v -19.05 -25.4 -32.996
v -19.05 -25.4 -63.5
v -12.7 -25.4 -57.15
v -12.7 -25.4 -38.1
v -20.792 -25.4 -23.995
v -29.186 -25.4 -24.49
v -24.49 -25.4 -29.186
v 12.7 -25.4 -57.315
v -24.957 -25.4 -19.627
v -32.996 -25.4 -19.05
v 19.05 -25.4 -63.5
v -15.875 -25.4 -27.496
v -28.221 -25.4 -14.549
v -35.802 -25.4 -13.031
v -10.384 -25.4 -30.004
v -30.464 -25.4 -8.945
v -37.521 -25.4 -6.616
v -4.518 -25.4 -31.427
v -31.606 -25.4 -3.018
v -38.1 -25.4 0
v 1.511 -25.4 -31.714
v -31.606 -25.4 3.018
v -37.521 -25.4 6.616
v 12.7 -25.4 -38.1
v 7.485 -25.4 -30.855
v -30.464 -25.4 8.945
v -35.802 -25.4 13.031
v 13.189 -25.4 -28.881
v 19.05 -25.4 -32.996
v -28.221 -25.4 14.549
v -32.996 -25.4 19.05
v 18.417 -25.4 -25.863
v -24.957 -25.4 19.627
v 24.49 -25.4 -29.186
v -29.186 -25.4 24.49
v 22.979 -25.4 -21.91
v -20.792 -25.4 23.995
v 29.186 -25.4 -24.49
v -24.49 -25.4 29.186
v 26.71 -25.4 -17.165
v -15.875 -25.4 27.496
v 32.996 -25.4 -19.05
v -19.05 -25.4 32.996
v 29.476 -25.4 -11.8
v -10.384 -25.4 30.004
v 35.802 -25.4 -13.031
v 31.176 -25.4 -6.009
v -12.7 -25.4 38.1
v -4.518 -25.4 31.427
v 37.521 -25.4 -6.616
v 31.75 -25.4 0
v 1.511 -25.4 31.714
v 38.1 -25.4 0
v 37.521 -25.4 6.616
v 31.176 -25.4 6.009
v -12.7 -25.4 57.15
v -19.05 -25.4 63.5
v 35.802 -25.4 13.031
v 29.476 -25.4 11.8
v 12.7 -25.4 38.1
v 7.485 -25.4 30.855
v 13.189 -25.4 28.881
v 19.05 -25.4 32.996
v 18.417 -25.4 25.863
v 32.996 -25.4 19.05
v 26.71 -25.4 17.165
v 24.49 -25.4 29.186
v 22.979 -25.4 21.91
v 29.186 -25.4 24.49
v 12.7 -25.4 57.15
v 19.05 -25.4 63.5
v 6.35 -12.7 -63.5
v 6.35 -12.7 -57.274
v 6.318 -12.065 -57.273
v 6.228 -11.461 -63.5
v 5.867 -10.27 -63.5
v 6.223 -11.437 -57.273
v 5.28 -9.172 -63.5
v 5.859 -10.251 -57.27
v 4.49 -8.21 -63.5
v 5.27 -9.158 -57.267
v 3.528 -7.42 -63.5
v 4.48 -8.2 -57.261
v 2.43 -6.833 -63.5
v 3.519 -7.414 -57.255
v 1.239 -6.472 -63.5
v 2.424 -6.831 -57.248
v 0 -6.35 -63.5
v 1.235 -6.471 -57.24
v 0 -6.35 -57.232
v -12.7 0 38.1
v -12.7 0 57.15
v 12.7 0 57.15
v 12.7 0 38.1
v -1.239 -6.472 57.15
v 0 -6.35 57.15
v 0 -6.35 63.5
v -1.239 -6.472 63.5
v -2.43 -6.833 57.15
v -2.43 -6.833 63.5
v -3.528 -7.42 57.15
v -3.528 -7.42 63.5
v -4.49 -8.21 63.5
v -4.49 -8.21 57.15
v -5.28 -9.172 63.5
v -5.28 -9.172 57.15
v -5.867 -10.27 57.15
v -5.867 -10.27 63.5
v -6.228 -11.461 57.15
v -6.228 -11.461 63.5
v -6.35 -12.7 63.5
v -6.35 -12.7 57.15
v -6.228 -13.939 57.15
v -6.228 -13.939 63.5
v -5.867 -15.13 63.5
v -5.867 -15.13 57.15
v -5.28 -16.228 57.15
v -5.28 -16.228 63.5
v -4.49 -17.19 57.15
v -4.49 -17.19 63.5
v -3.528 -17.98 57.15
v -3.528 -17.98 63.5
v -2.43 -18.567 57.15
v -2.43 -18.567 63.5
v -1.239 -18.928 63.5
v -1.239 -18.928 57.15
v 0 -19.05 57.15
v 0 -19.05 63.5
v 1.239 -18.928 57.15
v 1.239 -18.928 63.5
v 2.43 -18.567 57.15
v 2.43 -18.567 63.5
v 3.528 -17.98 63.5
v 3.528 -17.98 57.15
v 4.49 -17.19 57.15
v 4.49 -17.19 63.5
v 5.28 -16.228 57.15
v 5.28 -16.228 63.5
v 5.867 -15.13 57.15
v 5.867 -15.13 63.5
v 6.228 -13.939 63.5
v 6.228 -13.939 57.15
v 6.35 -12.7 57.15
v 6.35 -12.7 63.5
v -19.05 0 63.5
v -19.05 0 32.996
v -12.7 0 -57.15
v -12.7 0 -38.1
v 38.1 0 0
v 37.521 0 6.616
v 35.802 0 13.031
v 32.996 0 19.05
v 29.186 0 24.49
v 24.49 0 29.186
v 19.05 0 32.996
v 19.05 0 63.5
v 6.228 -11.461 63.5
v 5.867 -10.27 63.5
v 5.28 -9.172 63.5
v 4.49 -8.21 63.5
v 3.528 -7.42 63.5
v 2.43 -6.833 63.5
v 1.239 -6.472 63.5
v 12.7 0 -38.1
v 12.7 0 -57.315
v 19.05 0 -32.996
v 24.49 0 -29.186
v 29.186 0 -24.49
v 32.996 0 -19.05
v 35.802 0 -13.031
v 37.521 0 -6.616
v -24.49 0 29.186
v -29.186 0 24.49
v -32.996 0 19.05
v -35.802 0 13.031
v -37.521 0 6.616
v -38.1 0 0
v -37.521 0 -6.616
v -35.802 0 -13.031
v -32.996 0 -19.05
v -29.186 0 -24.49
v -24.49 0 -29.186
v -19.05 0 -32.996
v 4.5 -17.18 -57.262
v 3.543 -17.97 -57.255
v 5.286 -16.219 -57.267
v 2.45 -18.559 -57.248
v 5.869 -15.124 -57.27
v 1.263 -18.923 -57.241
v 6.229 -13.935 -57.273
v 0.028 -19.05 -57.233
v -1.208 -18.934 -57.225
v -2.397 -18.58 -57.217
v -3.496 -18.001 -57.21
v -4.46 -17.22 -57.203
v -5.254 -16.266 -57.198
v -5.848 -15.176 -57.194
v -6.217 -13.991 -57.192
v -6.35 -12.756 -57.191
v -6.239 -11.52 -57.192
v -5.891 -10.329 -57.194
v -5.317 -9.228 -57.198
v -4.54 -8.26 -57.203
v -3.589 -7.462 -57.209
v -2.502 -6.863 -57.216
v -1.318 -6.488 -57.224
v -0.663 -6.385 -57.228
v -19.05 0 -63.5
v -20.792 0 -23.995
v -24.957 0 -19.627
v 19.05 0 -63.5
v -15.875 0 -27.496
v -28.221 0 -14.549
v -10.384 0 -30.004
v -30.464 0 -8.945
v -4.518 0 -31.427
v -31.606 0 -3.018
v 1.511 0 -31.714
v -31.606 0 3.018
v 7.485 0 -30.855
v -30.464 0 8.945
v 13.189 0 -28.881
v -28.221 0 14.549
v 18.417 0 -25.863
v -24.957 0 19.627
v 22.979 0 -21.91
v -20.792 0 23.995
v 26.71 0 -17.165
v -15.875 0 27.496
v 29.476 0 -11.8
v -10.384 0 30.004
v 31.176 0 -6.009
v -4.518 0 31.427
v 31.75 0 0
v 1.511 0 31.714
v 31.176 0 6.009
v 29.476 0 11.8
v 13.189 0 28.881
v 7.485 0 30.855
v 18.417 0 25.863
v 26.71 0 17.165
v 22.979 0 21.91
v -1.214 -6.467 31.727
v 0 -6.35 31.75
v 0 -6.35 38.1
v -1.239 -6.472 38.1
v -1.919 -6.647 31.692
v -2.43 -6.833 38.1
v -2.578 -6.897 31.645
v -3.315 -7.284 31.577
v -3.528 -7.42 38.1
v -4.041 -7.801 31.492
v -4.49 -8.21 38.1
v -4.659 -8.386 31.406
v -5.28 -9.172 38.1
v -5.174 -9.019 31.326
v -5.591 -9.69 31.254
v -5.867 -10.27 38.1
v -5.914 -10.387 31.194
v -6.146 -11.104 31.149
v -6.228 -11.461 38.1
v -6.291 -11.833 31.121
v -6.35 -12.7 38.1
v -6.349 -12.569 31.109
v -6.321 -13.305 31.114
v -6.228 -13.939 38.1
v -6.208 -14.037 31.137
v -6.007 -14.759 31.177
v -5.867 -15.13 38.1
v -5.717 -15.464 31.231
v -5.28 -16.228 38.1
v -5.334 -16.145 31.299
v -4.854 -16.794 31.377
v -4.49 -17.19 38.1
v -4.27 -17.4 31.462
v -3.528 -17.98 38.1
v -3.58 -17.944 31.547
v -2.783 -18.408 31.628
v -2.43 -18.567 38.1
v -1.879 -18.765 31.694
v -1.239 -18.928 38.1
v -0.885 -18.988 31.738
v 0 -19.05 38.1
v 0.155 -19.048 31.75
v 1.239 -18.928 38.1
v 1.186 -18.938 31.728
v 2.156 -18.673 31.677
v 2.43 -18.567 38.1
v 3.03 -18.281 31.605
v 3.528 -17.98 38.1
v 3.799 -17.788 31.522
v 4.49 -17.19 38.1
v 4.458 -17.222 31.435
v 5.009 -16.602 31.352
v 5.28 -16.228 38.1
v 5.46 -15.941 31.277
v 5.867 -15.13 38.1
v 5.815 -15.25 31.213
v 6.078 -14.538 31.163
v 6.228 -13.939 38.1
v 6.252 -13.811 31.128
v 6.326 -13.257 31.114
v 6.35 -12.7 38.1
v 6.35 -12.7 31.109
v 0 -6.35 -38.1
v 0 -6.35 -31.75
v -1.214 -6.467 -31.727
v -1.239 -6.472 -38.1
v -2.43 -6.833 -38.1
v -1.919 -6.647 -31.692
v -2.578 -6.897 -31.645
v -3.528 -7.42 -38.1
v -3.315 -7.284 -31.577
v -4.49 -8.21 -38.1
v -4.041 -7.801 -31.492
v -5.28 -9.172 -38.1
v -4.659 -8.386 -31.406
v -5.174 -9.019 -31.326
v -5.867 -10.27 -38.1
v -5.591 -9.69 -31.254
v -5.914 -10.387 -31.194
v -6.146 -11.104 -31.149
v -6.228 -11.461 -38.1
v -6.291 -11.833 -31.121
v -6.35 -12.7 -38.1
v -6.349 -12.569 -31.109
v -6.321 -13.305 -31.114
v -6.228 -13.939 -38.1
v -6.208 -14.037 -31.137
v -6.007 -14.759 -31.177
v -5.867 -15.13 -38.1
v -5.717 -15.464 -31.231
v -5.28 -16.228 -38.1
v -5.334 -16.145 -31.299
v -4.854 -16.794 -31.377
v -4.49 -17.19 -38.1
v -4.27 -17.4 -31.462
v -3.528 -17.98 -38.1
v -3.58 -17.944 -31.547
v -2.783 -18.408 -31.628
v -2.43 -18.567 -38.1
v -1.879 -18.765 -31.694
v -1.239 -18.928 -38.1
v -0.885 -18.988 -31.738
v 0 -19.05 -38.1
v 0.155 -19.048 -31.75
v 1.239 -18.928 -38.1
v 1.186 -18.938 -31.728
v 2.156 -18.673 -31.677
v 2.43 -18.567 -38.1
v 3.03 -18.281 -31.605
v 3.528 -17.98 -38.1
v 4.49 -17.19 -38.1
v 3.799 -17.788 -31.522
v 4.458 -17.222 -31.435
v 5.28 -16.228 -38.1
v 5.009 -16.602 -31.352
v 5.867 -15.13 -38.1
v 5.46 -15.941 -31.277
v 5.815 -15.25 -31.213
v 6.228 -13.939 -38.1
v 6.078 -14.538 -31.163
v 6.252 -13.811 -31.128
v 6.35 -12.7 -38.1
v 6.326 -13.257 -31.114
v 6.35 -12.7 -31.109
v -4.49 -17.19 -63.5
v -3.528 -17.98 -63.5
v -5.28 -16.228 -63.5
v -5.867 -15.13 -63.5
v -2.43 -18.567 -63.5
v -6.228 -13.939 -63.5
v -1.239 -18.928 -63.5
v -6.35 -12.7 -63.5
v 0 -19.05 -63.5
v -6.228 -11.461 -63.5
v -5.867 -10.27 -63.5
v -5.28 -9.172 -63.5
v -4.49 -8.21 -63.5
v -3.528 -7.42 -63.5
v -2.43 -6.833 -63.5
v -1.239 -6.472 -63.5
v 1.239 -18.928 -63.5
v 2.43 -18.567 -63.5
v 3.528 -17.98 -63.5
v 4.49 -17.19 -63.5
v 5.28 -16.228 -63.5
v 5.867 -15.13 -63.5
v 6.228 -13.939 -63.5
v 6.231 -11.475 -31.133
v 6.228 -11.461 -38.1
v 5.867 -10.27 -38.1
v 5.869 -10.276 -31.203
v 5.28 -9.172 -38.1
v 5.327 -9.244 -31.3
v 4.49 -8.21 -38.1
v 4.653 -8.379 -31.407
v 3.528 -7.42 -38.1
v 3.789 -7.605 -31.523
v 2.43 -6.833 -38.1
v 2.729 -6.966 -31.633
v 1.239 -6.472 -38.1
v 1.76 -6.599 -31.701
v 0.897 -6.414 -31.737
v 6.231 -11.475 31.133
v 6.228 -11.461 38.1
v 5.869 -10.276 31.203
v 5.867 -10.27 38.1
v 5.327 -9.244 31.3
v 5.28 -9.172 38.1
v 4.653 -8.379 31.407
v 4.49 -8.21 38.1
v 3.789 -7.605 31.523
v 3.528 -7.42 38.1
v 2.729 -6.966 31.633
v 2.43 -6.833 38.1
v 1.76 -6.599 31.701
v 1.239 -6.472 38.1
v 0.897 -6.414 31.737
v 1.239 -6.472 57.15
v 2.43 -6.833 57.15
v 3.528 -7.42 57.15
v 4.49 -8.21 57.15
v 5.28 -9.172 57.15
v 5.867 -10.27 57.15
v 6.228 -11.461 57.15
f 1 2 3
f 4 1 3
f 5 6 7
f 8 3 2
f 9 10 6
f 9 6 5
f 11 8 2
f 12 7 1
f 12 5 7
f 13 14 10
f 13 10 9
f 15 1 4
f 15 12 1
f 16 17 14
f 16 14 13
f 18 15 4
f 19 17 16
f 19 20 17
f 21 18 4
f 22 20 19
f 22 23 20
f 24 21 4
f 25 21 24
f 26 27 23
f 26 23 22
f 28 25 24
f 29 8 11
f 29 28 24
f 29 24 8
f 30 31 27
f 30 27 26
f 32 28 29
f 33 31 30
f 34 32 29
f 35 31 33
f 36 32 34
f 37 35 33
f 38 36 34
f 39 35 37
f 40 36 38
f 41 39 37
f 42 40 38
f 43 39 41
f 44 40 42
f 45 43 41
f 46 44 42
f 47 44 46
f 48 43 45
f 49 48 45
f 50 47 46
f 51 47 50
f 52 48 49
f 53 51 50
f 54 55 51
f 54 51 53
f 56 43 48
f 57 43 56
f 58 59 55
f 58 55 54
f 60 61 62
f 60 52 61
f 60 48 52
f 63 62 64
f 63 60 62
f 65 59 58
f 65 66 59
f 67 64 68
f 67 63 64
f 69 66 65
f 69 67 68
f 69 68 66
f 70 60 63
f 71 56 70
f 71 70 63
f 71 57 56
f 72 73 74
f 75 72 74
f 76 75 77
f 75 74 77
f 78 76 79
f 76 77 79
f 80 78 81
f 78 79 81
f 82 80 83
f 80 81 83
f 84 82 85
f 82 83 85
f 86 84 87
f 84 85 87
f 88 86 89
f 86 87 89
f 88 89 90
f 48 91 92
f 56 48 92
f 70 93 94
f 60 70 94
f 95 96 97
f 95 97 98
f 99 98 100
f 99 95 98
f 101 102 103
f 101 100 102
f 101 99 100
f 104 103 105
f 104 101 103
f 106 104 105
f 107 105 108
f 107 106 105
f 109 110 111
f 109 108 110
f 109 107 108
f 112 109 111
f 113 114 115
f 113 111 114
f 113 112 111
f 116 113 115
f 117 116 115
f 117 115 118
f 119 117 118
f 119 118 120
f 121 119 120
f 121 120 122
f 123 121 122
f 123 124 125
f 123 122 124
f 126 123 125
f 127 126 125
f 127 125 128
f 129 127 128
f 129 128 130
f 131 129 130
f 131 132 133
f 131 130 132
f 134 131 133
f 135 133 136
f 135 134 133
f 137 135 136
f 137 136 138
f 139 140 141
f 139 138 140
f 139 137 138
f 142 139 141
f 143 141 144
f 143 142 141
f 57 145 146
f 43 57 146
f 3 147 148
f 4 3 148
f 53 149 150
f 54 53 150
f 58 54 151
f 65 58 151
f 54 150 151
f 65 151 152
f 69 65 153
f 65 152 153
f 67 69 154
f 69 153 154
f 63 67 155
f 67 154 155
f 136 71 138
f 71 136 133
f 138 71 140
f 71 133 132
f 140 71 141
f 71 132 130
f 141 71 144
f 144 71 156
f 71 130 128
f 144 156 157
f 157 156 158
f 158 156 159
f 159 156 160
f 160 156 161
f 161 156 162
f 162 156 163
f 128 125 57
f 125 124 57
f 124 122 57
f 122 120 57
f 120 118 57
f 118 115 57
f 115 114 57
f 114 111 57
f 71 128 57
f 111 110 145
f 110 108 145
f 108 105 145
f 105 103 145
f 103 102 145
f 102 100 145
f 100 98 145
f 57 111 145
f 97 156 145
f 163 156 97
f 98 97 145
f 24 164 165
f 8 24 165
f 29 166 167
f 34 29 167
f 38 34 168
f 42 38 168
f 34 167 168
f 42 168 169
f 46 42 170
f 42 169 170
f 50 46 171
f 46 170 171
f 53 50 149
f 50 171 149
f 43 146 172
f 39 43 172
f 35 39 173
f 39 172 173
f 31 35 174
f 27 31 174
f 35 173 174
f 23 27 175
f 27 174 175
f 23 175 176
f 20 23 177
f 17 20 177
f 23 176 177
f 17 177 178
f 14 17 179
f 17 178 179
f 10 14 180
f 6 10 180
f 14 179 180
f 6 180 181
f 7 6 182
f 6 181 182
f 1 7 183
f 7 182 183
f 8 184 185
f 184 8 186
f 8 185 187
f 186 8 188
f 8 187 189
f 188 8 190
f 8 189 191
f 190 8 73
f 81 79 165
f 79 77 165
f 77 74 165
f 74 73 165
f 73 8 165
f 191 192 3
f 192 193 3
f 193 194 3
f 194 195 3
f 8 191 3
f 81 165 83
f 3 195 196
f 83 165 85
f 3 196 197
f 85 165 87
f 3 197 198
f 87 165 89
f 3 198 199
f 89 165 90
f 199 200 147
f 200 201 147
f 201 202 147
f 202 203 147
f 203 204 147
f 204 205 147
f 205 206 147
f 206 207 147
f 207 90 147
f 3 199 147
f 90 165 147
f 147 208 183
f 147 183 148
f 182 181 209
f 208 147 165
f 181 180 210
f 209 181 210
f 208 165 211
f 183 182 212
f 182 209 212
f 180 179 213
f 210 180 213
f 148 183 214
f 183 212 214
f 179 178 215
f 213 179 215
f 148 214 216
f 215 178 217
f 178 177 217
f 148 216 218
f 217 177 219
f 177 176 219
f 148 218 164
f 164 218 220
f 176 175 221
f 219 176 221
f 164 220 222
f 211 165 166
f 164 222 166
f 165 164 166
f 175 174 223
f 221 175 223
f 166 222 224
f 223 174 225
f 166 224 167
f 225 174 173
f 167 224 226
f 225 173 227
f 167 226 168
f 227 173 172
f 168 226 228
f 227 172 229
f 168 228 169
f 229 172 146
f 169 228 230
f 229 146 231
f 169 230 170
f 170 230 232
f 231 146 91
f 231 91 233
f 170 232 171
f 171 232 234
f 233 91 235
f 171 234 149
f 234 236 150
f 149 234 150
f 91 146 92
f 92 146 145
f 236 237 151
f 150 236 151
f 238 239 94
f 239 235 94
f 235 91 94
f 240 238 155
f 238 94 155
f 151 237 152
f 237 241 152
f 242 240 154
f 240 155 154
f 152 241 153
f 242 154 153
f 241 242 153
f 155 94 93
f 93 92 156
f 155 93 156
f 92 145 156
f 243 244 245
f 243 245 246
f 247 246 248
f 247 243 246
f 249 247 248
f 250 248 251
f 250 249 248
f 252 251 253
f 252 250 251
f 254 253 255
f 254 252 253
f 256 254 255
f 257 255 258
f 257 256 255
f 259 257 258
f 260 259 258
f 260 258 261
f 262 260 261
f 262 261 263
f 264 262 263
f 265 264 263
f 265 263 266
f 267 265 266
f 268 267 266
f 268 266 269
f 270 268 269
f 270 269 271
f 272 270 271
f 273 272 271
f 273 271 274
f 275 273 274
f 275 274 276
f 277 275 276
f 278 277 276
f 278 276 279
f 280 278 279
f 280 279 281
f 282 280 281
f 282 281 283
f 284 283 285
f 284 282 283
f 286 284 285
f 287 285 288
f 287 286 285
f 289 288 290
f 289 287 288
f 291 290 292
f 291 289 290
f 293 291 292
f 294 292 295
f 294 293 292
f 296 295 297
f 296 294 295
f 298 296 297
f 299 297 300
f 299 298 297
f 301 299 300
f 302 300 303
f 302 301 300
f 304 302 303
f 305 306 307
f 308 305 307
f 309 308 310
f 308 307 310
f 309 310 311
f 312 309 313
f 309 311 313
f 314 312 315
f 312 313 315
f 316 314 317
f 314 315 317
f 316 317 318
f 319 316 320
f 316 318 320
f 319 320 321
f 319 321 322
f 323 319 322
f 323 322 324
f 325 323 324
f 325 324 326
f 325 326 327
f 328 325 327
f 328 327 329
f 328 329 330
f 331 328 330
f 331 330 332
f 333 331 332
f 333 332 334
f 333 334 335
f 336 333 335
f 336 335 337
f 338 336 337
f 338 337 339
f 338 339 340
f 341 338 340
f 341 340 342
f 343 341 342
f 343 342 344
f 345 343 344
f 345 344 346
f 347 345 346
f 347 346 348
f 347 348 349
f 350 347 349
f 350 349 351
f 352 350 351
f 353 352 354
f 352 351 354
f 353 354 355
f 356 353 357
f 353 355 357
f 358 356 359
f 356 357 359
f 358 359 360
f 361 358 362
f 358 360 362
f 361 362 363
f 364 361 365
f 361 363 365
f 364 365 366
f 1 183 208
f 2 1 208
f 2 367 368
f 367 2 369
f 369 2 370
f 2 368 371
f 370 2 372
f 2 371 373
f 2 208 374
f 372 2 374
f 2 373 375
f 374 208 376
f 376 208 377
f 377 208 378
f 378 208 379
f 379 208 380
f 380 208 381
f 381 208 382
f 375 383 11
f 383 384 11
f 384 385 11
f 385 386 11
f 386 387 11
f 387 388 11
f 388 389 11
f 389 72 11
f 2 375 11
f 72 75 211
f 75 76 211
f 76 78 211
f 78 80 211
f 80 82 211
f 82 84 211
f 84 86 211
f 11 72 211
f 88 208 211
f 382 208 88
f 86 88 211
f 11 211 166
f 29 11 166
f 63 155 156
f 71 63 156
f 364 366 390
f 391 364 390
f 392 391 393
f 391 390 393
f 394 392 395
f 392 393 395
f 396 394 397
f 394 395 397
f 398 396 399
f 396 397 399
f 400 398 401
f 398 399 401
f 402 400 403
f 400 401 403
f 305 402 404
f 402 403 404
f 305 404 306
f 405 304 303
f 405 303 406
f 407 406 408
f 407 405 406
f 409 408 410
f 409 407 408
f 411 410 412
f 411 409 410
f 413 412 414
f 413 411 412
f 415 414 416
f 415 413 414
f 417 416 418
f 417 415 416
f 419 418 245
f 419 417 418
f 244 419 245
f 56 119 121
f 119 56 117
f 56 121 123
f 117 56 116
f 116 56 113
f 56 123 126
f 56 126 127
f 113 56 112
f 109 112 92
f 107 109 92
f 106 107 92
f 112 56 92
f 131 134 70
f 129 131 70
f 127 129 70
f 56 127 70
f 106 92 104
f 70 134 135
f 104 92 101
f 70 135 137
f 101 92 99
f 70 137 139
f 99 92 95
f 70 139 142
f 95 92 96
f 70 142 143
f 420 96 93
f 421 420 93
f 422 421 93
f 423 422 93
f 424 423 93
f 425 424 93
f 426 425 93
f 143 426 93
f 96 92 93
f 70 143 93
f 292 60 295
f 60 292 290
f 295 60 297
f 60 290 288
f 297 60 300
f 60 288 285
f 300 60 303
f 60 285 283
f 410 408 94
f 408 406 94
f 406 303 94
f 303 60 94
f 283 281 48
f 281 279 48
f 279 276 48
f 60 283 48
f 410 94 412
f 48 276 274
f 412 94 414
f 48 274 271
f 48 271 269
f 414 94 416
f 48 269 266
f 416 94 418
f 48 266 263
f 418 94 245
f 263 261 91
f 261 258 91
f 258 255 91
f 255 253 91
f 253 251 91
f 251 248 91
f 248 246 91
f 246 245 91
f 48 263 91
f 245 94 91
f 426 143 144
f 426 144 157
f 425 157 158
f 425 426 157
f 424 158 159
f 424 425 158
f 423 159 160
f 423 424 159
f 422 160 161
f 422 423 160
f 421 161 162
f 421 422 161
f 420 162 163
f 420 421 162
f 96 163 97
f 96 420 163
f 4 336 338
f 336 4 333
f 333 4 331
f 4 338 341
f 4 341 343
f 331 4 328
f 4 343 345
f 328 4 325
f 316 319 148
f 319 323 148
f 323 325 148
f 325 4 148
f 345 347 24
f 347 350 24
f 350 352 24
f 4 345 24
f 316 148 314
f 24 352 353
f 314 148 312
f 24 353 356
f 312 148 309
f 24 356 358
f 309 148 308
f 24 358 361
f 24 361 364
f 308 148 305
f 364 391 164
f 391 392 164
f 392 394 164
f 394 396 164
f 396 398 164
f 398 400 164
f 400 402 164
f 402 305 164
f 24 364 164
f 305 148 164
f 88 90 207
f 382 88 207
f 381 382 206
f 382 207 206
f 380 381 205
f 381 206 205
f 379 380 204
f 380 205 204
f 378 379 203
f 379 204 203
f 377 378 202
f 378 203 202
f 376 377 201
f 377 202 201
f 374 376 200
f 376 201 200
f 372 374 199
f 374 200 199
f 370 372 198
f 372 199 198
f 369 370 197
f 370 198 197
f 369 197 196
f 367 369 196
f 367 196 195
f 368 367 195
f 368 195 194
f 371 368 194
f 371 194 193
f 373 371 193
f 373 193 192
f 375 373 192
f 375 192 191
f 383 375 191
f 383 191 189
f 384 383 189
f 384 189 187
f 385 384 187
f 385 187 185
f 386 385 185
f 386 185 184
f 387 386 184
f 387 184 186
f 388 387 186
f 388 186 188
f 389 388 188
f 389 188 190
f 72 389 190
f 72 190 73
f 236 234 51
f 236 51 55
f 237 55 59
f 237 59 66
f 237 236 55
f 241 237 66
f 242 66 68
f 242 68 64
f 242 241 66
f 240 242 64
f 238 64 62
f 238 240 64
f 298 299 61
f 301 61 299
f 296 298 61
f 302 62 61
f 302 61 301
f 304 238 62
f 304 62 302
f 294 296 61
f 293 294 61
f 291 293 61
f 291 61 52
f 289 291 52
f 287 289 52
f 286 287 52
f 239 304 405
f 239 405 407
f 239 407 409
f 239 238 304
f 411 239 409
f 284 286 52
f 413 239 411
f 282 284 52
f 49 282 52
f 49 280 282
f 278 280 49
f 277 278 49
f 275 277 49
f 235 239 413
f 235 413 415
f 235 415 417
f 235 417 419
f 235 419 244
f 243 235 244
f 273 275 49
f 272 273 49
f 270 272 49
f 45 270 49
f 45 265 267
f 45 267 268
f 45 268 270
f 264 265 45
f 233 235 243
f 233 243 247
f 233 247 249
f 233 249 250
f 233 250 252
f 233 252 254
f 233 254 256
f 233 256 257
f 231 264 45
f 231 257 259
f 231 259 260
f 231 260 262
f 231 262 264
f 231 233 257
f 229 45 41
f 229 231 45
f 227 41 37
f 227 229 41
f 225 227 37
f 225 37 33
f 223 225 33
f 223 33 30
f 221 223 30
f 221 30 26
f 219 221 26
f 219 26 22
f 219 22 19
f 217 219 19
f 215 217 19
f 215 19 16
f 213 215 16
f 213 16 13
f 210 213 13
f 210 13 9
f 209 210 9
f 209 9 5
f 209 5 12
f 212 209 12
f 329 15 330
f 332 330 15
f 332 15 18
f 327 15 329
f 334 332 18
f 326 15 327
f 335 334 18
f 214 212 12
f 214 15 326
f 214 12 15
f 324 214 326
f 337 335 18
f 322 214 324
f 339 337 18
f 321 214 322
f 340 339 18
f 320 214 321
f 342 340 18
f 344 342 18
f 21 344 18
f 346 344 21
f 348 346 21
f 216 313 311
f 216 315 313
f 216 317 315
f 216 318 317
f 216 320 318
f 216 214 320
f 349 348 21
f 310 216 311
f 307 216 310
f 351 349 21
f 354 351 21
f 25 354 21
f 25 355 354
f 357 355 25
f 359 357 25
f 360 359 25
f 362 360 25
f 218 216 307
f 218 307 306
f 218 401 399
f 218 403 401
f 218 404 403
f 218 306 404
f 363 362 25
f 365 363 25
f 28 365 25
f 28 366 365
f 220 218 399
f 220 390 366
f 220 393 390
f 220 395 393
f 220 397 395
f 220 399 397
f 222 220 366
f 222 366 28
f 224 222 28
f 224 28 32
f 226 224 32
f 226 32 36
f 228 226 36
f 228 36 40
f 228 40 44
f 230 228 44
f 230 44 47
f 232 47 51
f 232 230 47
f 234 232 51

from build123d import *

# Parameters (mm, degrees)
F0_R     = 31.75
F0_W     = 6.35
F0_H     = 6.35
F0_H_2   = 6.514672
F1_DEPTH = 25.4
F3_DEPTH = 102.108
F4_DEPTH = 65.278


with BuildPart() as f1:
    # F0 (on Front) → F1 (new body)
    with BuildSketch(Plane.XZ):
        with BuildLine():
            ThreePointArc((19.05, -32.995568), (32.995568, -19.05), (38.1, 0))
            ThreePointArc((38.1, 0), (32.995568, 19.05), (19.05, 32.995568))
            ThreePointArc((19.05, 32.995568), (9.861006, 36.801774), (0, 38.1))
            ThreePointArc((0, 38.1), (-9.861006, 36.801774), (-19.05, 32.995568))
            ThreePointArc((-19.05, 32.995568), (-38.1, 0), (-19.05, -32.995568))
            ThreePointArc((-19.05, -32.995568), (-9.861006, -36.801774), (0, -38.1))
            ThreePointArc((0, -38.1), (9.861006, -36.801774), (19.05, -32.995568))
        make_face()
        Circle(F0_R, mode=Mode.SUBTRACT)
        with BuildLine():
            ThreePointArc((0, 38.1), (9.861006, 36.801774), (19.05, 32.995568))
            Line((19.05, 32.995568), (19.05, 38.1))
            Line((19.05, 38.1), (12.7, 38.1))
            Line((12.7, 38.1), (0, 38.1))
        make_face()
        with BuildLine():
            Line((19.05, -38.1), (19.05, -32.995568))
            ThreePointArc((19.05, -32.995568), (9.861006, -36.801774), (0, -38.1))
            Line((0, -38.1), (12.7, -38.1))
            Line((12.7, -38.1), (19.05, -38.1))
        make_face()
        with BuildLine():
            ThreePointArc((-19.05, 32.995568), (-9.861006, 36.801774), (0, 38.1))
            Line((0, 38.1), (-12.7, 38.1))
            Line((-12.7, 38.1), (-19.05, 38.1))
            Line((-19.05, 38.1), (-19.05, 32.995568))
        make_face()
        with Locations((15.875, 41.275)):
            Rectangle(F0_W, F0_H)
        with BuildLine():
            Line((-12.7, -38.1), (0, -38.1))
            ThreePointArc((0, -38.1), (-9.861006, -36.801774), (-19.05, -32.995568))
            Line((-19.05, -32.995568), (-19.05, -38.1))
            Line((-19.05, -38.1), (-12.7, -38.1))
        make_face()
        with Locations((15.875, -41.357336)):
            Rectangle(F0_W, F0_H_2)
        with Locations((-15.875, 41.275)):
            Rectangle(F0_W, F0_H)
        Polygon((12.7, 44.45), (19.05, 44.45), (19.05, 63.5), (-19.05, 63.5), (-19.05, 44.45), (-12.7, 44.45), (-12.7, 57.15), (12.7, 57.15), align=None)
        with Locations((-15.875, -41.275)):
            Rectangle(F0_W, F0_H)
        Polygon((19.05, -63.5), (19.05, -44.614672), (12.7, -44.614672), (12.7, -57.314672), (-12.7, -57.15), (-12.7, -44.45), (-19.05, -44.45), (-19.05, -63.5), align=None)
    extrude(amount=F1_DEPTH)

    # F2 (on Top) → F3 (cut)
    with BuildSketch(Plane.XY):
        with BuildLine():
            ThreePointArc((0, -6.35), (-4.490128, -17.190128), (6.35, -12.7))
            ThreePointArc((6.35, -12.7), (4.490128, -8.209872), (0, -6.35))
        make_face()
    extrude(amount=-F3_DEPTH, mode=Mode.SUBTRACT)

    # F2 (on Top) → F4 (cut)
    with BuildSketch(Plane.XY):
        with BuildLine():
            ThreePointArc((0, -6.35), (-4.490128, -17.190128), (6.35, -12.7))
            ThreePointArc((6.35, -12.7), (4.490128, -8.209872), (0, -6.35))
        make_face()
    extrude(amount=F4_DEPTH, mode=Mode.SUBTRACT)


solid = f1.part
